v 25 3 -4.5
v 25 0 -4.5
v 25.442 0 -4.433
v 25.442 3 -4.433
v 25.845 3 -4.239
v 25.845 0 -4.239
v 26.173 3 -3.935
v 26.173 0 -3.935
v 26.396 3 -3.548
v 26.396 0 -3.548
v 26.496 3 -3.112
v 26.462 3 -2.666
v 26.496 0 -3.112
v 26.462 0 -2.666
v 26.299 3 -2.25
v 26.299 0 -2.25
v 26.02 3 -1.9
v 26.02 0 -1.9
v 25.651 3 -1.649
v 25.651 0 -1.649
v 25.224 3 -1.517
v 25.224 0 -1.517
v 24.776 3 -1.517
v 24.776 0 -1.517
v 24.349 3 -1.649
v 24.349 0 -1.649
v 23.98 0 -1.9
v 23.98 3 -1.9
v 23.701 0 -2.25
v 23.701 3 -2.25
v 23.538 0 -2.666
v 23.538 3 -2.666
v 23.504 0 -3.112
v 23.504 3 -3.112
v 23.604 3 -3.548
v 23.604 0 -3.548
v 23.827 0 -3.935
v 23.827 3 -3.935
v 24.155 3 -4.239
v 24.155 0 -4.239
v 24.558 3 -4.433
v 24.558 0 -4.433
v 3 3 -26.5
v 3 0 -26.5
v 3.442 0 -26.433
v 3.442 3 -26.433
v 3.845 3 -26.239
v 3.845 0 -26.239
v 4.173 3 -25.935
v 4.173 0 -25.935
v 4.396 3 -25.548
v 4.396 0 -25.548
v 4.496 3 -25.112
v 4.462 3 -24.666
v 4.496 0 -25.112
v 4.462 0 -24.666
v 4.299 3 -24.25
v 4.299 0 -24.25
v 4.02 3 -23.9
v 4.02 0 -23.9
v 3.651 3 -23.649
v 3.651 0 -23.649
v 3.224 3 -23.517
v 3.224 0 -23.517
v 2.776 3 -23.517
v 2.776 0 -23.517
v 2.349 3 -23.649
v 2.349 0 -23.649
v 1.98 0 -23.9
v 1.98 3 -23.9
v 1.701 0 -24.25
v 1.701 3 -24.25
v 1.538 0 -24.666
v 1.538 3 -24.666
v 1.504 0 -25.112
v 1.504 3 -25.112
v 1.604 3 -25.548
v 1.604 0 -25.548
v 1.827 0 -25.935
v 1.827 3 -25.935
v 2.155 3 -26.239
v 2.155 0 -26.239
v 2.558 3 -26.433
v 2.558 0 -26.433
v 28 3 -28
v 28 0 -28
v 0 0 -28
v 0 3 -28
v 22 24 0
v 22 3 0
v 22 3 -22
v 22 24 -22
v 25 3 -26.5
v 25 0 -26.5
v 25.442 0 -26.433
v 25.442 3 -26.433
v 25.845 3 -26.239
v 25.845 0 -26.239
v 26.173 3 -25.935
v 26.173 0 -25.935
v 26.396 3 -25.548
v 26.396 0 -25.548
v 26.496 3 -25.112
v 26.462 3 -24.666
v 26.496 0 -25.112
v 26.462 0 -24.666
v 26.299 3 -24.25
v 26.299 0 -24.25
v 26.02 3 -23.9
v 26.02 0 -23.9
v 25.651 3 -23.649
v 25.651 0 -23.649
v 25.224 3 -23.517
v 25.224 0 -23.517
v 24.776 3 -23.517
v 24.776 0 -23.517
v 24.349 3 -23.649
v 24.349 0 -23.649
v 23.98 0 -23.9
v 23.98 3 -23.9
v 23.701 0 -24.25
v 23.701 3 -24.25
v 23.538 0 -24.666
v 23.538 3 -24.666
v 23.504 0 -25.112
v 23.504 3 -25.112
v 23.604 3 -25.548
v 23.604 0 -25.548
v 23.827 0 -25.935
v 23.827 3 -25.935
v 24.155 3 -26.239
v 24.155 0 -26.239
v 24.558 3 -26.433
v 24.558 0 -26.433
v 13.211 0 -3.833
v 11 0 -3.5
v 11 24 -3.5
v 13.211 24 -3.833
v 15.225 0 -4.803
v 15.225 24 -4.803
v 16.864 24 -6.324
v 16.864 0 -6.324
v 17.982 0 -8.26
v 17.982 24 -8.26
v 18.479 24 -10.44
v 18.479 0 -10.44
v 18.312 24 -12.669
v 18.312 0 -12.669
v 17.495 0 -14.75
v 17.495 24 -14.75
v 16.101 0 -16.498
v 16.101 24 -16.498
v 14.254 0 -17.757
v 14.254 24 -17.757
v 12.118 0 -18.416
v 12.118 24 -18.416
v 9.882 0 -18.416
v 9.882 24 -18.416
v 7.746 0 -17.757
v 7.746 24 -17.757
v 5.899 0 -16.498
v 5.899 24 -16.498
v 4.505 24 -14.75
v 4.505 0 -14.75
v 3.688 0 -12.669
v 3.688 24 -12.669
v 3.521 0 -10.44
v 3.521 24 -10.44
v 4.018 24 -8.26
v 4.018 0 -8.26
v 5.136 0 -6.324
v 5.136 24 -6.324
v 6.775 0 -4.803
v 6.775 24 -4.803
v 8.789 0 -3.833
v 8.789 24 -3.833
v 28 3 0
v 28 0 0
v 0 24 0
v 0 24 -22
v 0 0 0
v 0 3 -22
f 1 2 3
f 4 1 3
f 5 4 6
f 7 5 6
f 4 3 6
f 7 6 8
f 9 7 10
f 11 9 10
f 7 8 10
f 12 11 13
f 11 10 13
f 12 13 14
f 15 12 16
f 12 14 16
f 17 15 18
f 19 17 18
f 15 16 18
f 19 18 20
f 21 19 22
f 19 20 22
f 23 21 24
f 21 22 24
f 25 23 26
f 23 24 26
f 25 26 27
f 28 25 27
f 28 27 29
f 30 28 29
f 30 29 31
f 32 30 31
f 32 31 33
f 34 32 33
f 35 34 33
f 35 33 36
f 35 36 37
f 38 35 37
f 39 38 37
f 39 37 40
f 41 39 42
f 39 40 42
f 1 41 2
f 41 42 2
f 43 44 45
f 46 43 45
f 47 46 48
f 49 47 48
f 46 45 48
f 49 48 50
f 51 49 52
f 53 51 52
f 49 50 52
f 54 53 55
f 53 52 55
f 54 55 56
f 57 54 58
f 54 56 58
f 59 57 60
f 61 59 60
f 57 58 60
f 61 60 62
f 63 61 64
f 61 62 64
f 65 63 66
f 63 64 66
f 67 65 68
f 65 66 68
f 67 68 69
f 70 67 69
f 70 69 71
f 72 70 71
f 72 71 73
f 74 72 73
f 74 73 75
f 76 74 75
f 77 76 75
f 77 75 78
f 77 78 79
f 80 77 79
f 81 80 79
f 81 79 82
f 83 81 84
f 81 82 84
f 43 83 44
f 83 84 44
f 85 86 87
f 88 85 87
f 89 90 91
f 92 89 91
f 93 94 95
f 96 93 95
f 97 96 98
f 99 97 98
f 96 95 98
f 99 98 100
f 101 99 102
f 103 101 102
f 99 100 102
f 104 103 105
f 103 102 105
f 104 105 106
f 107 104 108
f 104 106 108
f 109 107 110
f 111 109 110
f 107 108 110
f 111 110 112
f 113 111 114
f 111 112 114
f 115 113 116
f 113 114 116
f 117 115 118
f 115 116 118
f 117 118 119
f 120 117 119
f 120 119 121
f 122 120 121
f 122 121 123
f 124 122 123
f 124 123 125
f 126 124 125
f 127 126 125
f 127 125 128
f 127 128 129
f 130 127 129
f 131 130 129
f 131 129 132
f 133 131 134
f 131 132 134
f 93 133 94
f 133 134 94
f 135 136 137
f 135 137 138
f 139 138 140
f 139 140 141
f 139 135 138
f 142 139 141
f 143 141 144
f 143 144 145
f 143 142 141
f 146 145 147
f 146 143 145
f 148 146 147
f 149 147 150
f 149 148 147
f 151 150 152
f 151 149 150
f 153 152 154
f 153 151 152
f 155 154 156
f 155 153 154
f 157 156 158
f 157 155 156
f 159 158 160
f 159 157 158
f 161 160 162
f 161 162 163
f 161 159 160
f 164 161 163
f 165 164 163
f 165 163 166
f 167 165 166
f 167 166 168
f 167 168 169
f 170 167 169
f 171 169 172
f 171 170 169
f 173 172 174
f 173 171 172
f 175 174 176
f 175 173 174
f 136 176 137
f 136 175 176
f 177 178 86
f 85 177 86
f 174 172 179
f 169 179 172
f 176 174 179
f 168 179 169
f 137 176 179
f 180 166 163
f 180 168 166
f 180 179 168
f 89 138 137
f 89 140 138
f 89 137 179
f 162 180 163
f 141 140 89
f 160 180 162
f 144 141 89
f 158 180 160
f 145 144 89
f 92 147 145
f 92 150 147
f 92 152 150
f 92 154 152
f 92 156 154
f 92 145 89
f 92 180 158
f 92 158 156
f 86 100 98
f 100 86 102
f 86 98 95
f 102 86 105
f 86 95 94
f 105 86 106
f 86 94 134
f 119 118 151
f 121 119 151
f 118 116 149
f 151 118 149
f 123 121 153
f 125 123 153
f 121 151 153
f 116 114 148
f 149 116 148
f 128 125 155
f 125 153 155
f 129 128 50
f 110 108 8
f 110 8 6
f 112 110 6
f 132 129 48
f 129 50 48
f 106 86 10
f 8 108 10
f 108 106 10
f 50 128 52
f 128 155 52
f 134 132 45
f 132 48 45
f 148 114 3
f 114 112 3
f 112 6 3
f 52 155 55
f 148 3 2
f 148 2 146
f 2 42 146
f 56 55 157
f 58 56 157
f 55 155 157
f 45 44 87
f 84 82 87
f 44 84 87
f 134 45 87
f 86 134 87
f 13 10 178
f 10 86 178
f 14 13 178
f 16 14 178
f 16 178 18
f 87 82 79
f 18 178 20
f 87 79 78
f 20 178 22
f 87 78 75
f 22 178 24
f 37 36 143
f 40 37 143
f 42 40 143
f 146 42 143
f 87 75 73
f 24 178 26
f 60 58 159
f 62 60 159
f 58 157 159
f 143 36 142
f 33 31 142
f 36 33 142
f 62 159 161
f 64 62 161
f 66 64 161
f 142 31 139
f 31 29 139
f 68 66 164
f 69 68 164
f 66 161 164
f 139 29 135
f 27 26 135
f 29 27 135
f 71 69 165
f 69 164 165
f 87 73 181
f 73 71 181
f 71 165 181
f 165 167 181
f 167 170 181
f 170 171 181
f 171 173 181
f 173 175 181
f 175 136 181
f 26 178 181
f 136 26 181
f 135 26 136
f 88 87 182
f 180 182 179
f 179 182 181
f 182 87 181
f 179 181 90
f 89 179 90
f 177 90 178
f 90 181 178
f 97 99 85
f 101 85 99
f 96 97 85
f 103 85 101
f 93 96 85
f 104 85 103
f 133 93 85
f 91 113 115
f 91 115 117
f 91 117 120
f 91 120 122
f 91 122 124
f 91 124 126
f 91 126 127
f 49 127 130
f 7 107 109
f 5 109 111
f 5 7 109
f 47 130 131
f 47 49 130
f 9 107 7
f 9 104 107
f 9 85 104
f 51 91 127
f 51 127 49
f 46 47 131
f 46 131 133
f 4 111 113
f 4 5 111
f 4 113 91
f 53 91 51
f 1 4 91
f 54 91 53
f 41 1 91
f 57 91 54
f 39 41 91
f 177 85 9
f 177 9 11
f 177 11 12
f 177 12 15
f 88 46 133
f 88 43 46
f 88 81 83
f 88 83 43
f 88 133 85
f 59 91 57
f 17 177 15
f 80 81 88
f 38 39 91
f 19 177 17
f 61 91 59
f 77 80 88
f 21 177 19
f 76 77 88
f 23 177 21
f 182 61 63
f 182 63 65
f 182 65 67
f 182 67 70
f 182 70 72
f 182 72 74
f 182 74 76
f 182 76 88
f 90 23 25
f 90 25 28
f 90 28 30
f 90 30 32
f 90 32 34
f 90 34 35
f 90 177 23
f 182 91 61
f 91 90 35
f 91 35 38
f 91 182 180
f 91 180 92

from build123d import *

# Parameters (mm, degrees)
SKETCH1_W           = 22
SKETCH1_H           = 22
SKETCH1_R           = 7.5
BOSS_EXTRUDE1_DEPTH = 24
SKETCH2_R           = 1.5
BOSS_EXTRUDE2_DEPTH = 3


with BuildPart() as part:
    # Sketch1 → Boss-Extrude1 (new body)
    with BuildSketch(Plane(origin=(0, 0, 0), x_dir=(1, 0, 0), z_dir=(0, 1, 0))):
        with Locations((11, 11)):
            Rectangle(SKETCH1_W, SKETCH1_H)
        with Locations(Location((11, 11, 0), (0, 0, 270))):
            Circle(SKETCH1_R, mode=Mode.SUBTRACT)
    extrude(amount=BOSS_EXTRUDE1_DEPTH)

    # Sketch2 → Boss-Extrude2 (add)
    with BuildSketch(Plane.XZ):
        Polygon((0, -22), (22, -22), (22, 0), (28, 0), (28, -28), (0, -28), align=None)
        with Locations(Location((25, -25, 0), (0, 0, 270))):
            Circle(SKETCH2_R, mode=Mode.SUBTRACT)
        with Locations(Location((25, -3, 0), (0, 0, 270))):
            Circle(SKETCH2_R, mode=Mode.SUBTRACT)
        with Locations(Location((3, -25, 0), (0, 0, 270))):
            Circle(SKETCH2_R, mode=Mode.SUBTRACT)
    extrude(amount=-BOSS_EXTRUDE2_DEPTH)


solid = part.part
